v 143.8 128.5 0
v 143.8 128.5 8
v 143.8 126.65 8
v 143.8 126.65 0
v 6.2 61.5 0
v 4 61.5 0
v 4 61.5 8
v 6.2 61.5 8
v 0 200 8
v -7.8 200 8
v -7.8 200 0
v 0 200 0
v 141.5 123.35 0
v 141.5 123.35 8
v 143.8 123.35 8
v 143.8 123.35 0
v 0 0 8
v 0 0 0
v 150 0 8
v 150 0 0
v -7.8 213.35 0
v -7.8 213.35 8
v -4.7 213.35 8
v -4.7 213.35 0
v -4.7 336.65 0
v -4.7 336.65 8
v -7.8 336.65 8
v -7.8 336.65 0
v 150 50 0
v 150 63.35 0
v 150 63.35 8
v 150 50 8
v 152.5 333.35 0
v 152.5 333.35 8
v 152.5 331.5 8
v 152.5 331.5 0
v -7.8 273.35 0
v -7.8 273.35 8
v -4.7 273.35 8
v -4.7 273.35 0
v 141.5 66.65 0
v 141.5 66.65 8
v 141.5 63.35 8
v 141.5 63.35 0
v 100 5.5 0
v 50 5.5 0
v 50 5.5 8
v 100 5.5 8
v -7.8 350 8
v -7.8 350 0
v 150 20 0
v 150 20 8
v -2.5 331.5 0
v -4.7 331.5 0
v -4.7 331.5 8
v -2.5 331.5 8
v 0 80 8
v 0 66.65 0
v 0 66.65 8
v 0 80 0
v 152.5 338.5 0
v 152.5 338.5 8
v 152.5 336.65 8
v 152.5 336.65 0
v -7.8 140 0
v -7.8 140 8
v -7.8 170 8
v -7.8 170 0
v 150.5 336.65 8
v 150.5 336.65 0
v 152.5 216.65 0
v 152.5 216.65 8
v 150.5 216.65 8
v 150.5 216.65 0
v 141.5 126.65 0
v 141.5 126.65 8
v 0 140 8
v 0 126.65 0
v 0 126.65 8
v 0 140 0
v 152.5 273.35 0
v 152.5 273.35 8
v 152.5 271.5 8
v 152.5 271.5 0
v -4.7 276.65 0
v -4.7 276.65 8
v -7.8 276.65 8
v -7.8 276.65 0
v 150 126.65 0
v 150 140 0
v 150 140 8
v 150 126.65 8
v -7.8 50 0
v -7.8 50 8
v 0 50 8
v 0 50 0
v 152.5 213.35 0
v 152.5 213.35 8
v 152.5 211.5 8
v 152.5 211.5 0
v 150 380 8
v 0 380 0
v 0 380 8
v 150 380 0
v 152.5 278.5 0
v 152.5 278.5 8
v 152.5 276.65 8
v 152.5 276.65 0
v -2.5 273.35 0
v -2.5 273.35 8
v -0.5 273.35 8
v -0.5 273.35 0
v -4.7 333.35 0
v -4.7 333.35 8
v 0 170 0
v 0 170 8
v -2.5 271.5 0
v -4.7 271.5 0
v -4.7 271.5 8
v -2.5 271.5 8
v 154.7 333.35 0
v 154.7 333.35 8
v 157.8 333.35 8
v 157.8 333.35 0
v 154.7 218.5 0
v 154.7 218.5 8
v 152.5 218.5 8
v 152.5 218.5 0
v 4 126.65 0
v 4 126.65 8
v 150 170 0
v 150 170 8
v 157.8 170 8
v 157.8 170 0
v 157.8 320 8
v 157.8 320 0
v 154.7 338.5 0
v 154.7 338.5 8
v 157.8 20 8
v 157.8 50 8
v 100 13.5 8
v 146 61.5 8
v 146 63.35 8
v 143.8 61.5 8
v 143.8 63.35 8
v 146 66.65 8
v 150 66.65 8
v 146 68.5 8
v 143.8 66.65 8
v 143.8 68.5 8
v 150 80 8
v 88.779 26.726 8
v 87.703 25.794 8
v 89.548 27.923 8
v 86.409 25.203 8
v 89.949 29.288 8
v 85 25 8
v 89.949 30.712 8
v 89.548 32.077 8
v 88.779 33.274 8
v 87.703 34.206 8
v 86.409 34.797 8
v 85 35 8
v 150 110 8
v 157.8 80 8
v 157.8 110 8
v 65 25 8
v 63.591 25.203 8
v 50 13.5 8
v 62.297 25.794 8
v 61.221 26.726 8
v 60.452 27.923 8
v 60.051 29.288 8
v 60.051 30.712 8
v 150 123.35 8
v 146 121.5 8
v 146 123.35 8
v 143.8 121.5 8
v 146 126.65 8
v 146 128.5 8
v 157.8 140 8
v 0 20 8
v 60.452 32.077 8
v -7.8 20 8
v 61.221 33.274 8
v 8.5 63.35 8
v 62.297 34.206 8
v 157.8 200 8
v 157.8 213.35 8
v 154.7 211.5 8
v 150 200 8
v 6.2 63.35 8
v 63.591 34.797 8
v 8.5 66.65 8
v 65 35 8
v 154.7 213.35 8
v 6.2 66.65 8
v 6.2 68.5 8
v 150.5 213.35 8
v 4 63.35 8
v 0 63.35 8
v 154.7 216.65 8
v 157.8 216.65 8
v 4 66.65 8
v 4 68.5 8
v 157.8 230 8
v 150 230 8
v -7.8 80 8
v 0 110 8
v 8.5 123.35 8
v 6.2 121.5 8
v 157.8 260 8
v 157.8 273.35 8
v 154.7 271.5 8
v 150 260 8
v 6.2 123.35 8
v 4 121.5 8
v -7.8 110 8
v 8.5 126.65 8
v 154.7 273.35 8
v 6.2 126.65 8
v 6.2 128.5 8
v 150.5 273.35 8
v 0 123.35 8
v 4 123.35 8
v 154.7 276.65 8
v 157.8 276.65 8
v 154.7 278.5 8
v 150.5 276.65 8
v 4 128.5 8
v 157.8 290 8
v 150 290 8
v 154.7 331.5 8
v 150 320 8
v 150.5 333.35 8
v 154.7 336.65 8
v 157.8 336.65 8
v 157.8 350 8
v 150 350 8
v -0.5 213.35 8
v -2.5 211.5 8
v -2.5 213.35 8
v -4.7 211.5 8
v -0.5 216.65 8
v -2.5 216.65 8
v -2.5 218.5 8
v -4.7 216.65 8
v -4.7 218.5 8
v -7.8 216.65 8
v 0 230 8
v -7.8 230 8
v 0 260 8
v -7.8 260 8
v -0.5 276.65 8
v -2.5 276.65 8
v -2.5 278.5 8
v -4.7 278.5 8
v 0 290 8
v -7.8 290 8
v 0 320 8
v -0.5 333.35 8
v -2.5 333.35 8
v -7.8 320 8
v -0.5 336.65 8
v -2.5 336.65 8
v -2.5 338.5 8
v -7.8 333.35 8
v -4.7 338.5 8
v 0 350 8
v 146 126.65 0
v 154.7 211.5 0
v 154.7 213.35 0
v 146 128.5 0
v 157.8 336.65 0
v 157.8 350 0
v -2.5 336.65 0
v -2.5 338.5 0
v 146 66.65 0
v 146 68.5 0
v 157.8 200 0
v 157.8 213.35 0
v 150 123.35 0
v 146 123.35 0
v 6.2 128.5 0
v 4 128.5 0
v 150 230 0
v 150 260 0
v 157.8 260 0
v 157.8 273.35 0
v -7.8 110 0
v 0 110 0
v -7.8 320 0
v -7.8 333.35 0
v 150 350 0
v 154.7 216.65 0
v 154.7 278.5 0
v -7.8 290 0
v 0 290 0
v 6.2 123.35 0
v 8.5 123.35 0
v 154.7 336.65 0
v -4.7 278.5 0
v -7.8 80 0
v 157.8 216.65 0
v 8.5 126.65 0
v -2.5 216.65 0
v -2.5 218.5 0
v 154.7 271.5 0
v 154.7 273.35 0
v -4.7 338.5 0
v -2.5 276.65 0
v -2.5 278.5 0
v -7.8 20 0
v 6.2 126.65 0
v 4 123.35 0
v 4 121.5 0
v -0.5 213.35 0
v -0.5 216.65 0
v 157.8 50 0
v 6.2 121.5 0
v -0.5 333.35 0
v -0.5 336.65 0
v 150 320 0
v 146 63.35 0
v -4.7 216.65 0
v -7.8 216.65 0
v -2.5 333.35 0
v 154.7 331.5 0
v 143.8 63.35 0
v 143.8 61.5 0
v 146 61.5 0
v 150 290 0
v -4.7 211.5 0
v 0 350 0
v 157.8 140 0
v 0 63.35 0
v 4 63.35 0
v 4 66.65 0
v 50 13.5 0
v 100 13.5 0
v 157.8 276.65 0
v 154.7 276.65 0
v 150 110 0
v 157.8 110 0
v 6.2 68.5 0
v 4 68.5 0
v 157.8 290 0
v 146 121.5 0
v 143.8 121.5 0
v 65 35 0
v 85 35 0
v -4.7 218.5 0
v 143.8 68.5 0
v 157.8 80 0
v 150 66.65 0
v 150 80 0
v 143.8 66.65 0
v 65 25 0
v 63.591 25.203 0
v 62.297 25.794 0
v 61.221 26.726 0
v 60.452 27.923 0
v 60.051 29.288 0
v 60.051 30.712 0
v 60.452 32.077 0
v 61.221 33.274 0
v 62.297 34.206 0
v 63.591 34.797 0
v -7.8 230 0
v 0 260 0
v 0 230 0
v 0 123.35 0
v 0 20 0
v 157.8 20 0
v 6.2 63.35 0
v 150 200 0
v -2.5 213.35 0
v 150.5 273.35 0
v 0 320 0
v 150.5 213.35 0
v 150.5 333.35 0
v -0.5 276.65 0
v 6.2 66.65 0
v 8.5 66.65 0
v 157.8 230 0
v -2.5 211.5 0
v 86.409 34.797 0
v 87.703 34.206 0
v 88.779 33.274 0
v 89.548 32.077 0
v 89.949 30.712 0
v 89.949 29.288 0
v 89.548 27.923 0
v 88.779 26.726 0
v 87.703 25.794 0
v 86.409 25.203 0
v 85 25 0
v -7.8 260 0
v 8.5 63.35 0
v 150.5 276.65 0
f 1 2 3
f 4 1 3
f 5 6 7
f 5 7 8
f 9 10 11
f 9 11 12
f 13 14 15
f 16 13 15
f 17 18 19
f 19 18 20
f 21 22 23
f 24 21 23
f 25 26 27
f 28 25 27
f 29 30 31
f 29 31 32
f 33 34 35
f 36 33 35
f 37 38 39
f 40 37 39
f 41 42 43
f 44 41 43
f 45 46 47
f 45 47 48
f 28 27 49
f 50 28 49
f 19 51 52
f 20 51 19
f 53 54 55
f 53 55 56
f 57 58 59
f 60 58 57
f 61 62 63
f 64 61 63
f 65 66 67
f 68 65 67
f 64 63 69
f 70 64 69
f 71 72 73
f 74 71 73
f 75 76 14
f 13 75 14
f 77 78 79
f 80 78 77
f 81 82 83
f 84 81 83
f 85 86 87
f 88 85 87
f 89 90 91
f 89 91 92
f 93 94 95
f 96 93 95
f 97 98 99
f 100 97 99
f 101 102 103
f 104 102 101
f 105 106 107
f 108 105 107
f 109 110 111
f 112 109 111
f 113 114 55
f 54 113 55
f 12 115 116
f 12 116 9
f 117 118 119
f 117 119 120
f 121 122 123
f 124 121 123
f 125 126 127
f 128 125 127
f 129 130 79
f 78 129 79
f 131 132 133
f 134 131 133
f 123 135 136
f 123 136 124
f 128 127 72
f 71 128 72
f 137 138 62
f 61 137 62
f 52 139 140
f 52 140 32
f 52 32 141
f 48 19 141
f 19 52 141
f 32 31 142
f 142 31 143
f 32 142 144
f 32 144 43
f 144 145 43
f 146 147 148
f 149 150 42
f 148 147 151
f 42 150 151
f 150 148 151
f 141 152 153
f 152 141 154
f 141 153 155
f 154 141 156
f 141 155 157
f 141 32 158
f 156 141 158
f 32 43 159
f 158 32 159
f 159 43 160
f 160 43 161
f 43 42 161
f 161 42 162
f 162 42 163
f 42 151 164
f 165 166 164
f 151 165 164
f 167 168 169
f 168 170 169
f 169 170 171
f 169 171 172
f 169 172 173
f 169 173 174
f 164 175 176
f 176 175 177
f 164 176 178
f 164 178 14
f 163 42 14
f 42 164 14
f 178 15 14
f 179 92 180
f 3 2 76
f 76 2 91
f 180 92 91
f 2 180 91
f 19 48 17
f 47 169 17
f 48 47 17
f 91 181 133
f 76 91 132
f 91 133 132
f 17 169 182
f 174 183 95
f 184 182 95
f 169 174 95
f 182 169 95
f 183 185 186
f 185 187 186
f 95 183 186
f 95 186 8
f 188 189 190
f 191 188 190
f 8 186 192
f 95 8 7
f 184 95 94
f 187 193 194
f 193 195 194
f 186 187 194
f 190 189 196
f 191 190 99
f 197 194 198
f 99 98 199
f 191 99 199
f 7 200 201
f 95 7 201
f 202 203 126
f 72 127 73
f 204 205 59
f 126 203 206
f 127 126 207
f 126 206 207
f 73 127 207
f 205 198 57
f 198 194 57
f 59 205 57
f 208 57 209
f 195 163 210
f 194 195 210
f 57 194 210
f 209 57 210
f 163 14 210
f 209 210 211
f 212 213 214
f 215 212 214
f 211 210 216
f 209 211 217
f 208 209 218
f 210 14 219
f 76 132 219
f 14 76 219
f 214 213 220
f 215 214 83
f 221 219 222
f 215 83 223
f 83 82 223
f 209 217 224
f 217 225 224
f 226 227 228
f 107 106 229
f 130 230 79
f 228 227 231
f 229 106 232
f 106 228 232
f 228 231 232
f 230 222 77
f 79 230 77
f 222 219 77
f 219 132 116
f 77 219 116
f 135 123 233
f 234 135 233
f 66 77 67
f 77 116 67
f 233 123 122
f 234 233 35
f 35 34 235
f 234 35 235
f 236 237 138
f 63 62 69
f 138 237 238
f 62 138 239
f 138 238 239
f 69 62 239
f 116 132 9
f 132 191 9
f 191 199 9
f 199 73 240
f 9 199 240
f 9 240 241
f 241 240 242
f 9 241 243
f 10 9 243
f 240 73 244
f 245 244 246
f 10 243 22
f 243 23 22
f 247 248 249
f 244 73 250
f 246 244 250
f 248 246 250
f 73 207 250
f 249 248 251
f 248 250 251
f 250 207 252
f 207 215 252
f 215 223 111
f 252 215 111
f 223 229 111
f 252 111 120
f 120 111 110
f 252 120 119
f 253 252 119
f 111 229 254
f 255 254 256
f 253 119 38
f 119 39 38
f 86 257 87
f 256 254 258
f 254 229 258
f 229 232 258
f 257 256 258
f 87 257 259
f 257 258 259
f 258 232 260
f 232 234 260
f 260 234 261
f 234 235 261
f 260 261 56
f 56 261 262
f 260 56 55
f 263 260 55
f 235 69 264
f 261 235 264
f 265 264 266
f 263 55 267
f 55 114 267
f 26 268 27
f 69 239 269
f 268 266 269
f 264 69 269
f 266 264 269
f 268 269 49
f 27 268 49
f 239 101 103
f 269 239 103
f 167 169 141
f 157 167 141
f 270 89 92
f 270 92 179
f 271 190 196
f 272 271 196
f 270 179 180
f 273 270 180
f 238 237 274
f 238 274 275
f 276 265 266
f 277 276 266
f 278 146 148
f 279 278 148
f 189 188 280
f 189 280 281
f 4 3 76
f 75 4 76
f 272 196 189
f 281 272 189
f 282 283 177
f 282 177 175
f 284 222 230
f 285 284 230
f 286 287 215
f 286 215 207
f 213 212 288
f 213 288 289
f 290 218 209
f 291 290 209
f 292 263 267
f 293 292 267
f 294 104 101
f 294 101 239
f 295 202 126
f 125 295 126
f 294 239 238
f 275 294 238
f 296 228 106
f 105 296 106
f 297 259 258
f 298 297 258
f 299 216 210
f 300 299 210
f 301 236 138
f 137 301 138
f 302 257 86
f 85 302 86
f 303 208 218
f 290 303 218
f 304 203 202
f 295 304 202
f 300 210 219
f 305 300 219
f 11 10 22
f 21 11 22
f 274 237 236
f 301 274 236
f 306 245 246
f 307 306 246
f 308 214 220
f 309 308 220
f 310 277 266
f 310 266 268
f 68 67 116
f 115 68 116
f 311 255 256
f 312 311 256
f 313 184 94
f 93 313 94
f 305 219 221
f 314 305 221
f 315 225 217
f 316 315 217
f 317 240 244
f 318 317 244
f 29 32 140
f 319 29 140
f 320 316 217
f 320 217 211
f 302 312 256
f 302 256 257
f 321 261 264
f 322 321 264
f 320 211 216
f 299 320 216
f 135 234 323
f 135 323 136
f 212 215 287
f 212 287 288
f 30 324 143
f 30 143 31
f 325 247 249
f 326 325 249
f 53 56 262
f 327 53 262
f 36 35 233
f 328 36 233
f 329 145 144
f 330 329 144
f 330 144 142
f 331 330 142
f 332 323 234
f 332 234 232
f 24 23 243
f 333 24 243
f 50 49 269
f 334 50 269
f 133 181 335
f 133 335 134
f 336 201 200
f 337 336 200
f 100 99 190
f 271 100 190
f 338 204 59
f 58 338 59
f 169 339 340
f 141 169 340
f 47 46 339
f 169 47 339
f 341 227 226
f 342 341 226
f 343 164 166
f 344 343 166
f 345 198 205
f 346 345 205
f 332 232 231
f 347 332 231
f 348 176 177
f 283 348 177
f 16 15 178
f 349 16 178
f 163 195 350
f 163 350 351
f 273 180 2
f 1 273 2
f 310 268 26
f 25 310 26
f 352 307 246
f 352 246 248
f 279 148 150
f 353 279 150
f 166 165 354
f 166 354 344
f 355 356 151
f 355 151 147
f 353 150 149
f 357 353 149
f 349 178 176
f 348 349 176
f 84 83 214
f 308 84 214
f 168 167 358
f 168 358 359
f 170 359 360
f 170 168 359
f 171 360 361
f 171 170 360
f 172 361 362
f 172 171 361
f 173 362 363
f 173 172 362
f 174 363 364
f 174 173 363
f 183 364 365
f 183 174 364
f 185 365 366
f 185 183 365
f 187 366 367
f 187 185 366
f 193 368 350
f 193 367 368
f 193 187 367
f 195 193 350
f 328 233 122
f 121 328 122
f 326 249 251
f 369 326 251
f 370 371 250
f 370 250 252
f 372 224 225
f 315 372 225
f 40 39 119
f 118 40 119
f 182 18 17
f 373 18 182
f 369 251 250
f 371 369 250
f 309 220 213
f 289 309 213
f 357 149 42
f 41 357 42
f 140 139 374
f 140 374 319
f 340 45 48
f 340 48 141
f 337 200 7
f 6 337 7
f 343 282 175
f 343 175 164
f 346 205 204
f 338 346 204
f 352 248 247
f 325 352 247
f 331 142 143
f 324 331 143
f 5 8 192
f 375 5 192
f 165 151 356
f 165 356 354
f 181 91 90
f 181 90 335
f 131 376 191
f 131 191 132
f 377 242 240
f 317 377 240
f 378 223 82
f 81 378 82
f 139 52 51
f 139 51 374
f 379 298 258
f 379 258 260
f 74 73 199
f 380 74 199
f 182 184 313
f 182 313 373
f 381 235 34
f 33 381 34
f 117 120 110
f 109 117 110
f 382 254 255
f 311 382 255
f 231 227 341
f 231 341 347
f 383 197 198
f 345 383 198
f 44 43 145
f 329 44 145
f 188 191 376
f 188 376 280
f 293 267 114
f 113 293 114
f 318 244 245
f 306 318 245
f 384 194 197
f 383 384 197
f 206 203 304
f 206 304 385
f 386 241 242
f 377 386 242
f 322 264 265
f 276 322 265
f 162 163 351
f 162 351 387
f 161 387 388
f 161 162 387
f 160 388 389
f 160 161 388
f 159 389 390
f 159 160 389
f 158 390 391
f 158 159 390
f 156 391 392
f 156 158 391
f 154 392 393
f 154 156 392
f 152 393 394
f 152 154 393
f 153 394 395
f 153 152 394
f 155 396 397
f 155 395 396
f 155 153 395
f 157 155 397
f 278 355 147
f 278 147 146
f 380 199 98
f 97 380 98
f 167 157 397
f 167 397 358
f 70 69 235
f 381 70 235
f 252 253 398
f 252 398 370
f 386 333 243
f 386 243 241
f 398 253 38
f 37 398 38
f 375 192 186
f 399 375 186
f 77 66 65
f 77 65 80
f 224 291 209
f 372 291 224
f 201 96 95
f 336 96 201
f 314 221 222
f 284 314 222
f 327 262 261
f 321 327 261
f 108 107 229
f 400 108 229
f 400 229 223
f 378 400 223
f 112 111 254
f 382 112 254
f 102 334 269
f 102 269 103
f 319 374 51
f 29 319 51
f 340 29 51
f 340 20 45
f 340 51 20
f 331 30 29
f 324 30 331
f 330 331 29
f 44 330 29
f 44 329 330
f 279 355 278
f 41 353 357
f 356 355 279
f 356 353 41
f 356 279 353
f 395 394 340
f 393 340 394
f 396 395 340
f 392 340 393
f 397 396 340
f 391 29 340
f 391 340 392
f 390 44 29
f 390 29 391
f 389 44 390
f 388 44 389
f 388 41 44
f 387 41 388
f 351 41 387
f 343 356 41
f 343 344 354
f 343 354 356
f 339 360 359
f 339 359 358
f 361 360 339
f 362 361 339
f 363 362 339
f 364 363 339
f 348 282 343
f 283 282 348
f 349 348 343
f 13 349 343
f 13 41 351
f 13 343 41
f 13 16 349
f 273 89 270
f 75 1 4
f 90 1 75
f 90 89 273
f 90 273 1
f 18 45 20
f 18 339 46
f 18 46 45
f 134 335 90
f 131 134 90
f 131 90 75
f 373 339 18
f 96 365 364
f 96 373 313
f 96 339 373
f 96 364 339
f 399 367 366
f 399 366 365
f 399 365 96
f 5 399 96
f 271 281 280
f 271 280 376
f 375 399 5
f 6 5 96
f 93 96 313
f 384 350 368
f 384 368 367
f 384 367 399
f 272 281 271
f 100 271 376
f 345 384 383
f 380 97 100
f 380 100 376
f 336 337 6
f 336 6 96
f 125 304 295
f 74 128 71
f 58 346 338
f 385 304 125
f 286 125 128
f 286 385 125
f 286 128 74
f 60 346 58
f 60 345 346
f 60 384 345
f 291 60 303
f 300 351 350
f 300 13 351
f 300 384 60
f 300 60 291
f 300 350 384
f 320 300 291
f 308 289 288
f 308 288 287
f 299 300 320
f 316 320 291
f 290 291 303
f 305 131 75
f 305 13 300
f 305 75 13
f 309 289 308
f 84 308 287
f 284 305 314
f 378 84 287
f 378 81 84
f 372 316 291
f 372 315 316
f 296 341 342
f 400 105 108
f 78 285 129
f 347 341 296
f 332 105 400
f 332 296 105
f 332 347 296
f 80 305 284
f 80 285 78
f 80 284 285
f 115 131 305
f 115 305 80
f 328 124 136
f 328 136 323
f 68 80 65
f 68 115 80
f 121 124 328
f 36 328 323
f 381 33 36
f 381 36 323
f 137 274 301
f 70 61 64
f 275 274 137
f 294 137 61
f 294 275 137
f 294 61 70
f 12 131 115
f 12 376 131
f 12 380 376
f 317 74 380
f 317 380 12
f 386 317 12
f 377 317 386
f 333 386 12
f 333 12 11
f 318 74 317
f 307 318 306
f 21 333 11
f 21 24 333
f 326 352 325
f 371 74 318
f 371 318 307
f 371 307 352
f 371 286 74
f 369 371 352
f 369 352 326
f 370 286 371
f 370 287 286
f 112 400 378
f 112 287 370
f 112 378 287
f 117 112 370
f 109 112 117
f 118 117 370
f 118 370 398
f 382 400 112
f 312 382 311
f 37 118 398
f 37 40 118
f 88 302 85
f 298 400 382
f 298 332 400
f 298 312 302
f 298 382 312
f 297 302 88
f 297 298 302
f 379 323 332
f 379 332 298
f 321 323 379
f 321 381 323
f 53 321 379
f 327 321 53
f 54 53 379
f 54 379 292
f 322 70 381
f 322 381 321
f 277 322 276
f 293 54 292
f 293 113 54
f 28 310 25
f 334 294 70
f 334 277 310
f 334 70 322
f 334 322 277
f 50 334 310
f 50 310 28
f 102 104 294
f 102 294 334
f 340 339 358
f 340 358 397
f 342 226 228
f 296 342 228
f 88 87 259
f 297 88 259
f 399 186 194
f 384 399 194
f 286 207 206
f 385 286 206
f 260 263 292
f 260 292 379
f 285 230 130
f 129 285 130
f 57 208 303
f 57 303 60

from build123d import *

# Parameters (mm, degrees)
SKETCH1_W           = 50
SKETCH1_H           = 8
BOSS_EXTRUDE1_DEPTH = 8
SKETCH2_W           = 7.8
SKETCH2_H           = 30
BOSS_EXTRUDE2_DEPTH = 8
CUT_EXTRUDE1_DEPTH  = 9


with BuildPart() as part:
    # Sketch1 → Boss-Extrude1 (new body)
    with BuildSketch(Plane.XY):
        Polygon((0, 0), (0, 380), (150, 380), (150, 0), (75, 0), align=None)
        with Locations((75, 9.5)):
            Rectangle(SKETCH1_W, SKETCH1_H, mode=Mode.SUBTRACT)
    extrude(amount=BOSS_EXTRUDE1_DEPTH)

    # Sketch2 → Boss-Extrude2 (add)
    with BuildSketch(Plane.XY.offset(8)):
        with Locations((153.9, 335)):
            Rectangle(SKETCH2_W, SKETCH2_H)
        with Locations((-3.9, 35)):
            Rectangle(SKETCH2_W, SKETCH2_H)
        with Locations((-3.9, 95)):
            Rectangle(SKETCH2_W, SKETCH2_H)
        with Locations((-3.9, 155)):
            Rectangle(SKETCH2_W, SKETCH2_H)
        with Locations((-3.9, 215)):
            Rectangle(SKETCH2_W, SKETCH2_H)
        with Locations((-3.9, 275)):
            Rectangle(SKETCH2_W, SKETCH2_H)
        with Locations((-3.9, 335)):
            Rectangle(SKETCH2_W, SKETCH2_H)
        with Locations((153.9, 275)):
            Rectangle(SKETCH2_W, SKETCH2_H)
        with Locations((153.9, 215)):
            Rectangle(SKETCH2_W, SKETCH2_H)
        with Locations((153.9, 155)):
            Rectangle(SKETCH2_W, SKETCH2_H)
        with Locations((153.9, 95)):
            Rectangle(SKETCH2_W, SKETCH2_H)
        with Locations((153.9, 35)):
            Rectangle(SKETCH2_W, SKETCH2_H)
    extrude(amount=-BOSS_EXTRUDE2_DEPTH)

    # Sketch3 → Cut-Extrude1 (cut, through all)
    with BuildSketch(Plane.XY.offset(8)):
        with BuildLine():
            Line((65, 35), (85, 35))
            ThreePointArc((85, 35), (90, 30), (85, 25))
            Line((85, 25), (65, 25))
            ThreePointArc((65, 25), (60, 30), (65, 35))
        make_face()
        Polygon((150, 123.35), (150, 126.65), (146, 126.65), (146, 128.5), (143.8, 128.5), (143.8, 126.65), (141.5, 126.65), (141.5, 123.35), (143.8, 123.35), (143.8, 121.5), (146, 121.5), (146, 123.35), align=None)
        Polygon((157.8, 333.35), (157.8, 336.65), (154.7, 336.65), (154.7, 338.5), (152.5, 338.5), (152.5, 336.65), (150.5, 336.65), (150.5, 333.35), (152.5, 333.35), (152.5, 331.5), (154.7, 331.5), (154.7, 333.35), align=None)
        Polygon((0, 63.35), (4, 63.35), (4, 61.5), (6.2, 61.5), (6.2, 63.35), (8.5, 63.35), (8.5, 66.65), (6.2, 66.65), (6.2, 68.5), (4, 68.5), (4, 66.65), (0, 66.65), align=None)
        Polygon((0, 123.35), (4, 123.35), (4, 121.5), (6.2, 121.5), (6.2, 123.35), (8.5, 123.35), (8.5, 126.65), (6.2, 126.65), (6.2, 128.5), (4, 128.5), (4, 126.65), (0, 126.65), align=None)
        Polygon((-7.8, 333.35), (-4.7, 333.35), (-4.7, 331.5), (-2.5, 331.5), (-2.5, 333.35), (-0.5, 333.35), (-0.5, 336.65), (-2.5, 336.65), (-2.5, 338.5), (-4.7, 338.5), (-4.7, 336.65), (-7.8, 336.65), align=None)
        Polygon((150, 63.35), (150, 66.65), (146, 66.65), (146, 68.5), (143.8, 68.5), (143.8, 66.65), (141.5, 66.65), (141.5, 63.35), (143.8, 63.35), (143.8, 61.5), (146, 61.5), (146, 63.35), align=None)
        Polygon((157.8, 273.35), (157.8, 276.65), (154.7, 276.65), (154.7, 278.5), (152.5, 278.5), (152.5, 276.65), (150.5, 276.65), (150.5, 273.35), (152.5, 273.35), (152.5, 271.5), (154.7, 271.5), (154.7, 273.35), align=None)
        Polygon((-7.8, 273.35), (-4.7, 273.35), (-4.7, 271.5), (-2.5, 271.5), (-2.5, 273.35), (-0.5, 273.35), (-0.5, 276.65), (-2.5, 276.65), (-2.5, 278.5), (-4.7, 278.5), (-4.7, 276.65), (-7.8, 276.65), align=None)
        Polygon((157.8, 213.35), (157.8, 216.65), (154.7, 216.65), (154.7, 218.5), (152.5, 218.5), (152.5, 216.65), (150.5, 216.65), (150.5, 213.35), (152.5, 213.35), (152.5, 211.5), (154.7, 211.5), (154.7, 213.35), align=None)
        Polygon((-7.8, 213.35), (-4.7, 213.35), (-4.7, 211.5), (-2.5, 211.5), (-2.5, 213.35), (-0.5, 213.35), (-0.5, 216.65), (-2.5, 216.65), (-2.5, 218.5), (-4.7, 218.5), (-4.7, 216.65), (-7.8, 216.65), align=None)
    extrude(amount=-CUT_EXTRUDE1_DEPTH, mode=Mode.SUBTRACT)


solid = part.part
